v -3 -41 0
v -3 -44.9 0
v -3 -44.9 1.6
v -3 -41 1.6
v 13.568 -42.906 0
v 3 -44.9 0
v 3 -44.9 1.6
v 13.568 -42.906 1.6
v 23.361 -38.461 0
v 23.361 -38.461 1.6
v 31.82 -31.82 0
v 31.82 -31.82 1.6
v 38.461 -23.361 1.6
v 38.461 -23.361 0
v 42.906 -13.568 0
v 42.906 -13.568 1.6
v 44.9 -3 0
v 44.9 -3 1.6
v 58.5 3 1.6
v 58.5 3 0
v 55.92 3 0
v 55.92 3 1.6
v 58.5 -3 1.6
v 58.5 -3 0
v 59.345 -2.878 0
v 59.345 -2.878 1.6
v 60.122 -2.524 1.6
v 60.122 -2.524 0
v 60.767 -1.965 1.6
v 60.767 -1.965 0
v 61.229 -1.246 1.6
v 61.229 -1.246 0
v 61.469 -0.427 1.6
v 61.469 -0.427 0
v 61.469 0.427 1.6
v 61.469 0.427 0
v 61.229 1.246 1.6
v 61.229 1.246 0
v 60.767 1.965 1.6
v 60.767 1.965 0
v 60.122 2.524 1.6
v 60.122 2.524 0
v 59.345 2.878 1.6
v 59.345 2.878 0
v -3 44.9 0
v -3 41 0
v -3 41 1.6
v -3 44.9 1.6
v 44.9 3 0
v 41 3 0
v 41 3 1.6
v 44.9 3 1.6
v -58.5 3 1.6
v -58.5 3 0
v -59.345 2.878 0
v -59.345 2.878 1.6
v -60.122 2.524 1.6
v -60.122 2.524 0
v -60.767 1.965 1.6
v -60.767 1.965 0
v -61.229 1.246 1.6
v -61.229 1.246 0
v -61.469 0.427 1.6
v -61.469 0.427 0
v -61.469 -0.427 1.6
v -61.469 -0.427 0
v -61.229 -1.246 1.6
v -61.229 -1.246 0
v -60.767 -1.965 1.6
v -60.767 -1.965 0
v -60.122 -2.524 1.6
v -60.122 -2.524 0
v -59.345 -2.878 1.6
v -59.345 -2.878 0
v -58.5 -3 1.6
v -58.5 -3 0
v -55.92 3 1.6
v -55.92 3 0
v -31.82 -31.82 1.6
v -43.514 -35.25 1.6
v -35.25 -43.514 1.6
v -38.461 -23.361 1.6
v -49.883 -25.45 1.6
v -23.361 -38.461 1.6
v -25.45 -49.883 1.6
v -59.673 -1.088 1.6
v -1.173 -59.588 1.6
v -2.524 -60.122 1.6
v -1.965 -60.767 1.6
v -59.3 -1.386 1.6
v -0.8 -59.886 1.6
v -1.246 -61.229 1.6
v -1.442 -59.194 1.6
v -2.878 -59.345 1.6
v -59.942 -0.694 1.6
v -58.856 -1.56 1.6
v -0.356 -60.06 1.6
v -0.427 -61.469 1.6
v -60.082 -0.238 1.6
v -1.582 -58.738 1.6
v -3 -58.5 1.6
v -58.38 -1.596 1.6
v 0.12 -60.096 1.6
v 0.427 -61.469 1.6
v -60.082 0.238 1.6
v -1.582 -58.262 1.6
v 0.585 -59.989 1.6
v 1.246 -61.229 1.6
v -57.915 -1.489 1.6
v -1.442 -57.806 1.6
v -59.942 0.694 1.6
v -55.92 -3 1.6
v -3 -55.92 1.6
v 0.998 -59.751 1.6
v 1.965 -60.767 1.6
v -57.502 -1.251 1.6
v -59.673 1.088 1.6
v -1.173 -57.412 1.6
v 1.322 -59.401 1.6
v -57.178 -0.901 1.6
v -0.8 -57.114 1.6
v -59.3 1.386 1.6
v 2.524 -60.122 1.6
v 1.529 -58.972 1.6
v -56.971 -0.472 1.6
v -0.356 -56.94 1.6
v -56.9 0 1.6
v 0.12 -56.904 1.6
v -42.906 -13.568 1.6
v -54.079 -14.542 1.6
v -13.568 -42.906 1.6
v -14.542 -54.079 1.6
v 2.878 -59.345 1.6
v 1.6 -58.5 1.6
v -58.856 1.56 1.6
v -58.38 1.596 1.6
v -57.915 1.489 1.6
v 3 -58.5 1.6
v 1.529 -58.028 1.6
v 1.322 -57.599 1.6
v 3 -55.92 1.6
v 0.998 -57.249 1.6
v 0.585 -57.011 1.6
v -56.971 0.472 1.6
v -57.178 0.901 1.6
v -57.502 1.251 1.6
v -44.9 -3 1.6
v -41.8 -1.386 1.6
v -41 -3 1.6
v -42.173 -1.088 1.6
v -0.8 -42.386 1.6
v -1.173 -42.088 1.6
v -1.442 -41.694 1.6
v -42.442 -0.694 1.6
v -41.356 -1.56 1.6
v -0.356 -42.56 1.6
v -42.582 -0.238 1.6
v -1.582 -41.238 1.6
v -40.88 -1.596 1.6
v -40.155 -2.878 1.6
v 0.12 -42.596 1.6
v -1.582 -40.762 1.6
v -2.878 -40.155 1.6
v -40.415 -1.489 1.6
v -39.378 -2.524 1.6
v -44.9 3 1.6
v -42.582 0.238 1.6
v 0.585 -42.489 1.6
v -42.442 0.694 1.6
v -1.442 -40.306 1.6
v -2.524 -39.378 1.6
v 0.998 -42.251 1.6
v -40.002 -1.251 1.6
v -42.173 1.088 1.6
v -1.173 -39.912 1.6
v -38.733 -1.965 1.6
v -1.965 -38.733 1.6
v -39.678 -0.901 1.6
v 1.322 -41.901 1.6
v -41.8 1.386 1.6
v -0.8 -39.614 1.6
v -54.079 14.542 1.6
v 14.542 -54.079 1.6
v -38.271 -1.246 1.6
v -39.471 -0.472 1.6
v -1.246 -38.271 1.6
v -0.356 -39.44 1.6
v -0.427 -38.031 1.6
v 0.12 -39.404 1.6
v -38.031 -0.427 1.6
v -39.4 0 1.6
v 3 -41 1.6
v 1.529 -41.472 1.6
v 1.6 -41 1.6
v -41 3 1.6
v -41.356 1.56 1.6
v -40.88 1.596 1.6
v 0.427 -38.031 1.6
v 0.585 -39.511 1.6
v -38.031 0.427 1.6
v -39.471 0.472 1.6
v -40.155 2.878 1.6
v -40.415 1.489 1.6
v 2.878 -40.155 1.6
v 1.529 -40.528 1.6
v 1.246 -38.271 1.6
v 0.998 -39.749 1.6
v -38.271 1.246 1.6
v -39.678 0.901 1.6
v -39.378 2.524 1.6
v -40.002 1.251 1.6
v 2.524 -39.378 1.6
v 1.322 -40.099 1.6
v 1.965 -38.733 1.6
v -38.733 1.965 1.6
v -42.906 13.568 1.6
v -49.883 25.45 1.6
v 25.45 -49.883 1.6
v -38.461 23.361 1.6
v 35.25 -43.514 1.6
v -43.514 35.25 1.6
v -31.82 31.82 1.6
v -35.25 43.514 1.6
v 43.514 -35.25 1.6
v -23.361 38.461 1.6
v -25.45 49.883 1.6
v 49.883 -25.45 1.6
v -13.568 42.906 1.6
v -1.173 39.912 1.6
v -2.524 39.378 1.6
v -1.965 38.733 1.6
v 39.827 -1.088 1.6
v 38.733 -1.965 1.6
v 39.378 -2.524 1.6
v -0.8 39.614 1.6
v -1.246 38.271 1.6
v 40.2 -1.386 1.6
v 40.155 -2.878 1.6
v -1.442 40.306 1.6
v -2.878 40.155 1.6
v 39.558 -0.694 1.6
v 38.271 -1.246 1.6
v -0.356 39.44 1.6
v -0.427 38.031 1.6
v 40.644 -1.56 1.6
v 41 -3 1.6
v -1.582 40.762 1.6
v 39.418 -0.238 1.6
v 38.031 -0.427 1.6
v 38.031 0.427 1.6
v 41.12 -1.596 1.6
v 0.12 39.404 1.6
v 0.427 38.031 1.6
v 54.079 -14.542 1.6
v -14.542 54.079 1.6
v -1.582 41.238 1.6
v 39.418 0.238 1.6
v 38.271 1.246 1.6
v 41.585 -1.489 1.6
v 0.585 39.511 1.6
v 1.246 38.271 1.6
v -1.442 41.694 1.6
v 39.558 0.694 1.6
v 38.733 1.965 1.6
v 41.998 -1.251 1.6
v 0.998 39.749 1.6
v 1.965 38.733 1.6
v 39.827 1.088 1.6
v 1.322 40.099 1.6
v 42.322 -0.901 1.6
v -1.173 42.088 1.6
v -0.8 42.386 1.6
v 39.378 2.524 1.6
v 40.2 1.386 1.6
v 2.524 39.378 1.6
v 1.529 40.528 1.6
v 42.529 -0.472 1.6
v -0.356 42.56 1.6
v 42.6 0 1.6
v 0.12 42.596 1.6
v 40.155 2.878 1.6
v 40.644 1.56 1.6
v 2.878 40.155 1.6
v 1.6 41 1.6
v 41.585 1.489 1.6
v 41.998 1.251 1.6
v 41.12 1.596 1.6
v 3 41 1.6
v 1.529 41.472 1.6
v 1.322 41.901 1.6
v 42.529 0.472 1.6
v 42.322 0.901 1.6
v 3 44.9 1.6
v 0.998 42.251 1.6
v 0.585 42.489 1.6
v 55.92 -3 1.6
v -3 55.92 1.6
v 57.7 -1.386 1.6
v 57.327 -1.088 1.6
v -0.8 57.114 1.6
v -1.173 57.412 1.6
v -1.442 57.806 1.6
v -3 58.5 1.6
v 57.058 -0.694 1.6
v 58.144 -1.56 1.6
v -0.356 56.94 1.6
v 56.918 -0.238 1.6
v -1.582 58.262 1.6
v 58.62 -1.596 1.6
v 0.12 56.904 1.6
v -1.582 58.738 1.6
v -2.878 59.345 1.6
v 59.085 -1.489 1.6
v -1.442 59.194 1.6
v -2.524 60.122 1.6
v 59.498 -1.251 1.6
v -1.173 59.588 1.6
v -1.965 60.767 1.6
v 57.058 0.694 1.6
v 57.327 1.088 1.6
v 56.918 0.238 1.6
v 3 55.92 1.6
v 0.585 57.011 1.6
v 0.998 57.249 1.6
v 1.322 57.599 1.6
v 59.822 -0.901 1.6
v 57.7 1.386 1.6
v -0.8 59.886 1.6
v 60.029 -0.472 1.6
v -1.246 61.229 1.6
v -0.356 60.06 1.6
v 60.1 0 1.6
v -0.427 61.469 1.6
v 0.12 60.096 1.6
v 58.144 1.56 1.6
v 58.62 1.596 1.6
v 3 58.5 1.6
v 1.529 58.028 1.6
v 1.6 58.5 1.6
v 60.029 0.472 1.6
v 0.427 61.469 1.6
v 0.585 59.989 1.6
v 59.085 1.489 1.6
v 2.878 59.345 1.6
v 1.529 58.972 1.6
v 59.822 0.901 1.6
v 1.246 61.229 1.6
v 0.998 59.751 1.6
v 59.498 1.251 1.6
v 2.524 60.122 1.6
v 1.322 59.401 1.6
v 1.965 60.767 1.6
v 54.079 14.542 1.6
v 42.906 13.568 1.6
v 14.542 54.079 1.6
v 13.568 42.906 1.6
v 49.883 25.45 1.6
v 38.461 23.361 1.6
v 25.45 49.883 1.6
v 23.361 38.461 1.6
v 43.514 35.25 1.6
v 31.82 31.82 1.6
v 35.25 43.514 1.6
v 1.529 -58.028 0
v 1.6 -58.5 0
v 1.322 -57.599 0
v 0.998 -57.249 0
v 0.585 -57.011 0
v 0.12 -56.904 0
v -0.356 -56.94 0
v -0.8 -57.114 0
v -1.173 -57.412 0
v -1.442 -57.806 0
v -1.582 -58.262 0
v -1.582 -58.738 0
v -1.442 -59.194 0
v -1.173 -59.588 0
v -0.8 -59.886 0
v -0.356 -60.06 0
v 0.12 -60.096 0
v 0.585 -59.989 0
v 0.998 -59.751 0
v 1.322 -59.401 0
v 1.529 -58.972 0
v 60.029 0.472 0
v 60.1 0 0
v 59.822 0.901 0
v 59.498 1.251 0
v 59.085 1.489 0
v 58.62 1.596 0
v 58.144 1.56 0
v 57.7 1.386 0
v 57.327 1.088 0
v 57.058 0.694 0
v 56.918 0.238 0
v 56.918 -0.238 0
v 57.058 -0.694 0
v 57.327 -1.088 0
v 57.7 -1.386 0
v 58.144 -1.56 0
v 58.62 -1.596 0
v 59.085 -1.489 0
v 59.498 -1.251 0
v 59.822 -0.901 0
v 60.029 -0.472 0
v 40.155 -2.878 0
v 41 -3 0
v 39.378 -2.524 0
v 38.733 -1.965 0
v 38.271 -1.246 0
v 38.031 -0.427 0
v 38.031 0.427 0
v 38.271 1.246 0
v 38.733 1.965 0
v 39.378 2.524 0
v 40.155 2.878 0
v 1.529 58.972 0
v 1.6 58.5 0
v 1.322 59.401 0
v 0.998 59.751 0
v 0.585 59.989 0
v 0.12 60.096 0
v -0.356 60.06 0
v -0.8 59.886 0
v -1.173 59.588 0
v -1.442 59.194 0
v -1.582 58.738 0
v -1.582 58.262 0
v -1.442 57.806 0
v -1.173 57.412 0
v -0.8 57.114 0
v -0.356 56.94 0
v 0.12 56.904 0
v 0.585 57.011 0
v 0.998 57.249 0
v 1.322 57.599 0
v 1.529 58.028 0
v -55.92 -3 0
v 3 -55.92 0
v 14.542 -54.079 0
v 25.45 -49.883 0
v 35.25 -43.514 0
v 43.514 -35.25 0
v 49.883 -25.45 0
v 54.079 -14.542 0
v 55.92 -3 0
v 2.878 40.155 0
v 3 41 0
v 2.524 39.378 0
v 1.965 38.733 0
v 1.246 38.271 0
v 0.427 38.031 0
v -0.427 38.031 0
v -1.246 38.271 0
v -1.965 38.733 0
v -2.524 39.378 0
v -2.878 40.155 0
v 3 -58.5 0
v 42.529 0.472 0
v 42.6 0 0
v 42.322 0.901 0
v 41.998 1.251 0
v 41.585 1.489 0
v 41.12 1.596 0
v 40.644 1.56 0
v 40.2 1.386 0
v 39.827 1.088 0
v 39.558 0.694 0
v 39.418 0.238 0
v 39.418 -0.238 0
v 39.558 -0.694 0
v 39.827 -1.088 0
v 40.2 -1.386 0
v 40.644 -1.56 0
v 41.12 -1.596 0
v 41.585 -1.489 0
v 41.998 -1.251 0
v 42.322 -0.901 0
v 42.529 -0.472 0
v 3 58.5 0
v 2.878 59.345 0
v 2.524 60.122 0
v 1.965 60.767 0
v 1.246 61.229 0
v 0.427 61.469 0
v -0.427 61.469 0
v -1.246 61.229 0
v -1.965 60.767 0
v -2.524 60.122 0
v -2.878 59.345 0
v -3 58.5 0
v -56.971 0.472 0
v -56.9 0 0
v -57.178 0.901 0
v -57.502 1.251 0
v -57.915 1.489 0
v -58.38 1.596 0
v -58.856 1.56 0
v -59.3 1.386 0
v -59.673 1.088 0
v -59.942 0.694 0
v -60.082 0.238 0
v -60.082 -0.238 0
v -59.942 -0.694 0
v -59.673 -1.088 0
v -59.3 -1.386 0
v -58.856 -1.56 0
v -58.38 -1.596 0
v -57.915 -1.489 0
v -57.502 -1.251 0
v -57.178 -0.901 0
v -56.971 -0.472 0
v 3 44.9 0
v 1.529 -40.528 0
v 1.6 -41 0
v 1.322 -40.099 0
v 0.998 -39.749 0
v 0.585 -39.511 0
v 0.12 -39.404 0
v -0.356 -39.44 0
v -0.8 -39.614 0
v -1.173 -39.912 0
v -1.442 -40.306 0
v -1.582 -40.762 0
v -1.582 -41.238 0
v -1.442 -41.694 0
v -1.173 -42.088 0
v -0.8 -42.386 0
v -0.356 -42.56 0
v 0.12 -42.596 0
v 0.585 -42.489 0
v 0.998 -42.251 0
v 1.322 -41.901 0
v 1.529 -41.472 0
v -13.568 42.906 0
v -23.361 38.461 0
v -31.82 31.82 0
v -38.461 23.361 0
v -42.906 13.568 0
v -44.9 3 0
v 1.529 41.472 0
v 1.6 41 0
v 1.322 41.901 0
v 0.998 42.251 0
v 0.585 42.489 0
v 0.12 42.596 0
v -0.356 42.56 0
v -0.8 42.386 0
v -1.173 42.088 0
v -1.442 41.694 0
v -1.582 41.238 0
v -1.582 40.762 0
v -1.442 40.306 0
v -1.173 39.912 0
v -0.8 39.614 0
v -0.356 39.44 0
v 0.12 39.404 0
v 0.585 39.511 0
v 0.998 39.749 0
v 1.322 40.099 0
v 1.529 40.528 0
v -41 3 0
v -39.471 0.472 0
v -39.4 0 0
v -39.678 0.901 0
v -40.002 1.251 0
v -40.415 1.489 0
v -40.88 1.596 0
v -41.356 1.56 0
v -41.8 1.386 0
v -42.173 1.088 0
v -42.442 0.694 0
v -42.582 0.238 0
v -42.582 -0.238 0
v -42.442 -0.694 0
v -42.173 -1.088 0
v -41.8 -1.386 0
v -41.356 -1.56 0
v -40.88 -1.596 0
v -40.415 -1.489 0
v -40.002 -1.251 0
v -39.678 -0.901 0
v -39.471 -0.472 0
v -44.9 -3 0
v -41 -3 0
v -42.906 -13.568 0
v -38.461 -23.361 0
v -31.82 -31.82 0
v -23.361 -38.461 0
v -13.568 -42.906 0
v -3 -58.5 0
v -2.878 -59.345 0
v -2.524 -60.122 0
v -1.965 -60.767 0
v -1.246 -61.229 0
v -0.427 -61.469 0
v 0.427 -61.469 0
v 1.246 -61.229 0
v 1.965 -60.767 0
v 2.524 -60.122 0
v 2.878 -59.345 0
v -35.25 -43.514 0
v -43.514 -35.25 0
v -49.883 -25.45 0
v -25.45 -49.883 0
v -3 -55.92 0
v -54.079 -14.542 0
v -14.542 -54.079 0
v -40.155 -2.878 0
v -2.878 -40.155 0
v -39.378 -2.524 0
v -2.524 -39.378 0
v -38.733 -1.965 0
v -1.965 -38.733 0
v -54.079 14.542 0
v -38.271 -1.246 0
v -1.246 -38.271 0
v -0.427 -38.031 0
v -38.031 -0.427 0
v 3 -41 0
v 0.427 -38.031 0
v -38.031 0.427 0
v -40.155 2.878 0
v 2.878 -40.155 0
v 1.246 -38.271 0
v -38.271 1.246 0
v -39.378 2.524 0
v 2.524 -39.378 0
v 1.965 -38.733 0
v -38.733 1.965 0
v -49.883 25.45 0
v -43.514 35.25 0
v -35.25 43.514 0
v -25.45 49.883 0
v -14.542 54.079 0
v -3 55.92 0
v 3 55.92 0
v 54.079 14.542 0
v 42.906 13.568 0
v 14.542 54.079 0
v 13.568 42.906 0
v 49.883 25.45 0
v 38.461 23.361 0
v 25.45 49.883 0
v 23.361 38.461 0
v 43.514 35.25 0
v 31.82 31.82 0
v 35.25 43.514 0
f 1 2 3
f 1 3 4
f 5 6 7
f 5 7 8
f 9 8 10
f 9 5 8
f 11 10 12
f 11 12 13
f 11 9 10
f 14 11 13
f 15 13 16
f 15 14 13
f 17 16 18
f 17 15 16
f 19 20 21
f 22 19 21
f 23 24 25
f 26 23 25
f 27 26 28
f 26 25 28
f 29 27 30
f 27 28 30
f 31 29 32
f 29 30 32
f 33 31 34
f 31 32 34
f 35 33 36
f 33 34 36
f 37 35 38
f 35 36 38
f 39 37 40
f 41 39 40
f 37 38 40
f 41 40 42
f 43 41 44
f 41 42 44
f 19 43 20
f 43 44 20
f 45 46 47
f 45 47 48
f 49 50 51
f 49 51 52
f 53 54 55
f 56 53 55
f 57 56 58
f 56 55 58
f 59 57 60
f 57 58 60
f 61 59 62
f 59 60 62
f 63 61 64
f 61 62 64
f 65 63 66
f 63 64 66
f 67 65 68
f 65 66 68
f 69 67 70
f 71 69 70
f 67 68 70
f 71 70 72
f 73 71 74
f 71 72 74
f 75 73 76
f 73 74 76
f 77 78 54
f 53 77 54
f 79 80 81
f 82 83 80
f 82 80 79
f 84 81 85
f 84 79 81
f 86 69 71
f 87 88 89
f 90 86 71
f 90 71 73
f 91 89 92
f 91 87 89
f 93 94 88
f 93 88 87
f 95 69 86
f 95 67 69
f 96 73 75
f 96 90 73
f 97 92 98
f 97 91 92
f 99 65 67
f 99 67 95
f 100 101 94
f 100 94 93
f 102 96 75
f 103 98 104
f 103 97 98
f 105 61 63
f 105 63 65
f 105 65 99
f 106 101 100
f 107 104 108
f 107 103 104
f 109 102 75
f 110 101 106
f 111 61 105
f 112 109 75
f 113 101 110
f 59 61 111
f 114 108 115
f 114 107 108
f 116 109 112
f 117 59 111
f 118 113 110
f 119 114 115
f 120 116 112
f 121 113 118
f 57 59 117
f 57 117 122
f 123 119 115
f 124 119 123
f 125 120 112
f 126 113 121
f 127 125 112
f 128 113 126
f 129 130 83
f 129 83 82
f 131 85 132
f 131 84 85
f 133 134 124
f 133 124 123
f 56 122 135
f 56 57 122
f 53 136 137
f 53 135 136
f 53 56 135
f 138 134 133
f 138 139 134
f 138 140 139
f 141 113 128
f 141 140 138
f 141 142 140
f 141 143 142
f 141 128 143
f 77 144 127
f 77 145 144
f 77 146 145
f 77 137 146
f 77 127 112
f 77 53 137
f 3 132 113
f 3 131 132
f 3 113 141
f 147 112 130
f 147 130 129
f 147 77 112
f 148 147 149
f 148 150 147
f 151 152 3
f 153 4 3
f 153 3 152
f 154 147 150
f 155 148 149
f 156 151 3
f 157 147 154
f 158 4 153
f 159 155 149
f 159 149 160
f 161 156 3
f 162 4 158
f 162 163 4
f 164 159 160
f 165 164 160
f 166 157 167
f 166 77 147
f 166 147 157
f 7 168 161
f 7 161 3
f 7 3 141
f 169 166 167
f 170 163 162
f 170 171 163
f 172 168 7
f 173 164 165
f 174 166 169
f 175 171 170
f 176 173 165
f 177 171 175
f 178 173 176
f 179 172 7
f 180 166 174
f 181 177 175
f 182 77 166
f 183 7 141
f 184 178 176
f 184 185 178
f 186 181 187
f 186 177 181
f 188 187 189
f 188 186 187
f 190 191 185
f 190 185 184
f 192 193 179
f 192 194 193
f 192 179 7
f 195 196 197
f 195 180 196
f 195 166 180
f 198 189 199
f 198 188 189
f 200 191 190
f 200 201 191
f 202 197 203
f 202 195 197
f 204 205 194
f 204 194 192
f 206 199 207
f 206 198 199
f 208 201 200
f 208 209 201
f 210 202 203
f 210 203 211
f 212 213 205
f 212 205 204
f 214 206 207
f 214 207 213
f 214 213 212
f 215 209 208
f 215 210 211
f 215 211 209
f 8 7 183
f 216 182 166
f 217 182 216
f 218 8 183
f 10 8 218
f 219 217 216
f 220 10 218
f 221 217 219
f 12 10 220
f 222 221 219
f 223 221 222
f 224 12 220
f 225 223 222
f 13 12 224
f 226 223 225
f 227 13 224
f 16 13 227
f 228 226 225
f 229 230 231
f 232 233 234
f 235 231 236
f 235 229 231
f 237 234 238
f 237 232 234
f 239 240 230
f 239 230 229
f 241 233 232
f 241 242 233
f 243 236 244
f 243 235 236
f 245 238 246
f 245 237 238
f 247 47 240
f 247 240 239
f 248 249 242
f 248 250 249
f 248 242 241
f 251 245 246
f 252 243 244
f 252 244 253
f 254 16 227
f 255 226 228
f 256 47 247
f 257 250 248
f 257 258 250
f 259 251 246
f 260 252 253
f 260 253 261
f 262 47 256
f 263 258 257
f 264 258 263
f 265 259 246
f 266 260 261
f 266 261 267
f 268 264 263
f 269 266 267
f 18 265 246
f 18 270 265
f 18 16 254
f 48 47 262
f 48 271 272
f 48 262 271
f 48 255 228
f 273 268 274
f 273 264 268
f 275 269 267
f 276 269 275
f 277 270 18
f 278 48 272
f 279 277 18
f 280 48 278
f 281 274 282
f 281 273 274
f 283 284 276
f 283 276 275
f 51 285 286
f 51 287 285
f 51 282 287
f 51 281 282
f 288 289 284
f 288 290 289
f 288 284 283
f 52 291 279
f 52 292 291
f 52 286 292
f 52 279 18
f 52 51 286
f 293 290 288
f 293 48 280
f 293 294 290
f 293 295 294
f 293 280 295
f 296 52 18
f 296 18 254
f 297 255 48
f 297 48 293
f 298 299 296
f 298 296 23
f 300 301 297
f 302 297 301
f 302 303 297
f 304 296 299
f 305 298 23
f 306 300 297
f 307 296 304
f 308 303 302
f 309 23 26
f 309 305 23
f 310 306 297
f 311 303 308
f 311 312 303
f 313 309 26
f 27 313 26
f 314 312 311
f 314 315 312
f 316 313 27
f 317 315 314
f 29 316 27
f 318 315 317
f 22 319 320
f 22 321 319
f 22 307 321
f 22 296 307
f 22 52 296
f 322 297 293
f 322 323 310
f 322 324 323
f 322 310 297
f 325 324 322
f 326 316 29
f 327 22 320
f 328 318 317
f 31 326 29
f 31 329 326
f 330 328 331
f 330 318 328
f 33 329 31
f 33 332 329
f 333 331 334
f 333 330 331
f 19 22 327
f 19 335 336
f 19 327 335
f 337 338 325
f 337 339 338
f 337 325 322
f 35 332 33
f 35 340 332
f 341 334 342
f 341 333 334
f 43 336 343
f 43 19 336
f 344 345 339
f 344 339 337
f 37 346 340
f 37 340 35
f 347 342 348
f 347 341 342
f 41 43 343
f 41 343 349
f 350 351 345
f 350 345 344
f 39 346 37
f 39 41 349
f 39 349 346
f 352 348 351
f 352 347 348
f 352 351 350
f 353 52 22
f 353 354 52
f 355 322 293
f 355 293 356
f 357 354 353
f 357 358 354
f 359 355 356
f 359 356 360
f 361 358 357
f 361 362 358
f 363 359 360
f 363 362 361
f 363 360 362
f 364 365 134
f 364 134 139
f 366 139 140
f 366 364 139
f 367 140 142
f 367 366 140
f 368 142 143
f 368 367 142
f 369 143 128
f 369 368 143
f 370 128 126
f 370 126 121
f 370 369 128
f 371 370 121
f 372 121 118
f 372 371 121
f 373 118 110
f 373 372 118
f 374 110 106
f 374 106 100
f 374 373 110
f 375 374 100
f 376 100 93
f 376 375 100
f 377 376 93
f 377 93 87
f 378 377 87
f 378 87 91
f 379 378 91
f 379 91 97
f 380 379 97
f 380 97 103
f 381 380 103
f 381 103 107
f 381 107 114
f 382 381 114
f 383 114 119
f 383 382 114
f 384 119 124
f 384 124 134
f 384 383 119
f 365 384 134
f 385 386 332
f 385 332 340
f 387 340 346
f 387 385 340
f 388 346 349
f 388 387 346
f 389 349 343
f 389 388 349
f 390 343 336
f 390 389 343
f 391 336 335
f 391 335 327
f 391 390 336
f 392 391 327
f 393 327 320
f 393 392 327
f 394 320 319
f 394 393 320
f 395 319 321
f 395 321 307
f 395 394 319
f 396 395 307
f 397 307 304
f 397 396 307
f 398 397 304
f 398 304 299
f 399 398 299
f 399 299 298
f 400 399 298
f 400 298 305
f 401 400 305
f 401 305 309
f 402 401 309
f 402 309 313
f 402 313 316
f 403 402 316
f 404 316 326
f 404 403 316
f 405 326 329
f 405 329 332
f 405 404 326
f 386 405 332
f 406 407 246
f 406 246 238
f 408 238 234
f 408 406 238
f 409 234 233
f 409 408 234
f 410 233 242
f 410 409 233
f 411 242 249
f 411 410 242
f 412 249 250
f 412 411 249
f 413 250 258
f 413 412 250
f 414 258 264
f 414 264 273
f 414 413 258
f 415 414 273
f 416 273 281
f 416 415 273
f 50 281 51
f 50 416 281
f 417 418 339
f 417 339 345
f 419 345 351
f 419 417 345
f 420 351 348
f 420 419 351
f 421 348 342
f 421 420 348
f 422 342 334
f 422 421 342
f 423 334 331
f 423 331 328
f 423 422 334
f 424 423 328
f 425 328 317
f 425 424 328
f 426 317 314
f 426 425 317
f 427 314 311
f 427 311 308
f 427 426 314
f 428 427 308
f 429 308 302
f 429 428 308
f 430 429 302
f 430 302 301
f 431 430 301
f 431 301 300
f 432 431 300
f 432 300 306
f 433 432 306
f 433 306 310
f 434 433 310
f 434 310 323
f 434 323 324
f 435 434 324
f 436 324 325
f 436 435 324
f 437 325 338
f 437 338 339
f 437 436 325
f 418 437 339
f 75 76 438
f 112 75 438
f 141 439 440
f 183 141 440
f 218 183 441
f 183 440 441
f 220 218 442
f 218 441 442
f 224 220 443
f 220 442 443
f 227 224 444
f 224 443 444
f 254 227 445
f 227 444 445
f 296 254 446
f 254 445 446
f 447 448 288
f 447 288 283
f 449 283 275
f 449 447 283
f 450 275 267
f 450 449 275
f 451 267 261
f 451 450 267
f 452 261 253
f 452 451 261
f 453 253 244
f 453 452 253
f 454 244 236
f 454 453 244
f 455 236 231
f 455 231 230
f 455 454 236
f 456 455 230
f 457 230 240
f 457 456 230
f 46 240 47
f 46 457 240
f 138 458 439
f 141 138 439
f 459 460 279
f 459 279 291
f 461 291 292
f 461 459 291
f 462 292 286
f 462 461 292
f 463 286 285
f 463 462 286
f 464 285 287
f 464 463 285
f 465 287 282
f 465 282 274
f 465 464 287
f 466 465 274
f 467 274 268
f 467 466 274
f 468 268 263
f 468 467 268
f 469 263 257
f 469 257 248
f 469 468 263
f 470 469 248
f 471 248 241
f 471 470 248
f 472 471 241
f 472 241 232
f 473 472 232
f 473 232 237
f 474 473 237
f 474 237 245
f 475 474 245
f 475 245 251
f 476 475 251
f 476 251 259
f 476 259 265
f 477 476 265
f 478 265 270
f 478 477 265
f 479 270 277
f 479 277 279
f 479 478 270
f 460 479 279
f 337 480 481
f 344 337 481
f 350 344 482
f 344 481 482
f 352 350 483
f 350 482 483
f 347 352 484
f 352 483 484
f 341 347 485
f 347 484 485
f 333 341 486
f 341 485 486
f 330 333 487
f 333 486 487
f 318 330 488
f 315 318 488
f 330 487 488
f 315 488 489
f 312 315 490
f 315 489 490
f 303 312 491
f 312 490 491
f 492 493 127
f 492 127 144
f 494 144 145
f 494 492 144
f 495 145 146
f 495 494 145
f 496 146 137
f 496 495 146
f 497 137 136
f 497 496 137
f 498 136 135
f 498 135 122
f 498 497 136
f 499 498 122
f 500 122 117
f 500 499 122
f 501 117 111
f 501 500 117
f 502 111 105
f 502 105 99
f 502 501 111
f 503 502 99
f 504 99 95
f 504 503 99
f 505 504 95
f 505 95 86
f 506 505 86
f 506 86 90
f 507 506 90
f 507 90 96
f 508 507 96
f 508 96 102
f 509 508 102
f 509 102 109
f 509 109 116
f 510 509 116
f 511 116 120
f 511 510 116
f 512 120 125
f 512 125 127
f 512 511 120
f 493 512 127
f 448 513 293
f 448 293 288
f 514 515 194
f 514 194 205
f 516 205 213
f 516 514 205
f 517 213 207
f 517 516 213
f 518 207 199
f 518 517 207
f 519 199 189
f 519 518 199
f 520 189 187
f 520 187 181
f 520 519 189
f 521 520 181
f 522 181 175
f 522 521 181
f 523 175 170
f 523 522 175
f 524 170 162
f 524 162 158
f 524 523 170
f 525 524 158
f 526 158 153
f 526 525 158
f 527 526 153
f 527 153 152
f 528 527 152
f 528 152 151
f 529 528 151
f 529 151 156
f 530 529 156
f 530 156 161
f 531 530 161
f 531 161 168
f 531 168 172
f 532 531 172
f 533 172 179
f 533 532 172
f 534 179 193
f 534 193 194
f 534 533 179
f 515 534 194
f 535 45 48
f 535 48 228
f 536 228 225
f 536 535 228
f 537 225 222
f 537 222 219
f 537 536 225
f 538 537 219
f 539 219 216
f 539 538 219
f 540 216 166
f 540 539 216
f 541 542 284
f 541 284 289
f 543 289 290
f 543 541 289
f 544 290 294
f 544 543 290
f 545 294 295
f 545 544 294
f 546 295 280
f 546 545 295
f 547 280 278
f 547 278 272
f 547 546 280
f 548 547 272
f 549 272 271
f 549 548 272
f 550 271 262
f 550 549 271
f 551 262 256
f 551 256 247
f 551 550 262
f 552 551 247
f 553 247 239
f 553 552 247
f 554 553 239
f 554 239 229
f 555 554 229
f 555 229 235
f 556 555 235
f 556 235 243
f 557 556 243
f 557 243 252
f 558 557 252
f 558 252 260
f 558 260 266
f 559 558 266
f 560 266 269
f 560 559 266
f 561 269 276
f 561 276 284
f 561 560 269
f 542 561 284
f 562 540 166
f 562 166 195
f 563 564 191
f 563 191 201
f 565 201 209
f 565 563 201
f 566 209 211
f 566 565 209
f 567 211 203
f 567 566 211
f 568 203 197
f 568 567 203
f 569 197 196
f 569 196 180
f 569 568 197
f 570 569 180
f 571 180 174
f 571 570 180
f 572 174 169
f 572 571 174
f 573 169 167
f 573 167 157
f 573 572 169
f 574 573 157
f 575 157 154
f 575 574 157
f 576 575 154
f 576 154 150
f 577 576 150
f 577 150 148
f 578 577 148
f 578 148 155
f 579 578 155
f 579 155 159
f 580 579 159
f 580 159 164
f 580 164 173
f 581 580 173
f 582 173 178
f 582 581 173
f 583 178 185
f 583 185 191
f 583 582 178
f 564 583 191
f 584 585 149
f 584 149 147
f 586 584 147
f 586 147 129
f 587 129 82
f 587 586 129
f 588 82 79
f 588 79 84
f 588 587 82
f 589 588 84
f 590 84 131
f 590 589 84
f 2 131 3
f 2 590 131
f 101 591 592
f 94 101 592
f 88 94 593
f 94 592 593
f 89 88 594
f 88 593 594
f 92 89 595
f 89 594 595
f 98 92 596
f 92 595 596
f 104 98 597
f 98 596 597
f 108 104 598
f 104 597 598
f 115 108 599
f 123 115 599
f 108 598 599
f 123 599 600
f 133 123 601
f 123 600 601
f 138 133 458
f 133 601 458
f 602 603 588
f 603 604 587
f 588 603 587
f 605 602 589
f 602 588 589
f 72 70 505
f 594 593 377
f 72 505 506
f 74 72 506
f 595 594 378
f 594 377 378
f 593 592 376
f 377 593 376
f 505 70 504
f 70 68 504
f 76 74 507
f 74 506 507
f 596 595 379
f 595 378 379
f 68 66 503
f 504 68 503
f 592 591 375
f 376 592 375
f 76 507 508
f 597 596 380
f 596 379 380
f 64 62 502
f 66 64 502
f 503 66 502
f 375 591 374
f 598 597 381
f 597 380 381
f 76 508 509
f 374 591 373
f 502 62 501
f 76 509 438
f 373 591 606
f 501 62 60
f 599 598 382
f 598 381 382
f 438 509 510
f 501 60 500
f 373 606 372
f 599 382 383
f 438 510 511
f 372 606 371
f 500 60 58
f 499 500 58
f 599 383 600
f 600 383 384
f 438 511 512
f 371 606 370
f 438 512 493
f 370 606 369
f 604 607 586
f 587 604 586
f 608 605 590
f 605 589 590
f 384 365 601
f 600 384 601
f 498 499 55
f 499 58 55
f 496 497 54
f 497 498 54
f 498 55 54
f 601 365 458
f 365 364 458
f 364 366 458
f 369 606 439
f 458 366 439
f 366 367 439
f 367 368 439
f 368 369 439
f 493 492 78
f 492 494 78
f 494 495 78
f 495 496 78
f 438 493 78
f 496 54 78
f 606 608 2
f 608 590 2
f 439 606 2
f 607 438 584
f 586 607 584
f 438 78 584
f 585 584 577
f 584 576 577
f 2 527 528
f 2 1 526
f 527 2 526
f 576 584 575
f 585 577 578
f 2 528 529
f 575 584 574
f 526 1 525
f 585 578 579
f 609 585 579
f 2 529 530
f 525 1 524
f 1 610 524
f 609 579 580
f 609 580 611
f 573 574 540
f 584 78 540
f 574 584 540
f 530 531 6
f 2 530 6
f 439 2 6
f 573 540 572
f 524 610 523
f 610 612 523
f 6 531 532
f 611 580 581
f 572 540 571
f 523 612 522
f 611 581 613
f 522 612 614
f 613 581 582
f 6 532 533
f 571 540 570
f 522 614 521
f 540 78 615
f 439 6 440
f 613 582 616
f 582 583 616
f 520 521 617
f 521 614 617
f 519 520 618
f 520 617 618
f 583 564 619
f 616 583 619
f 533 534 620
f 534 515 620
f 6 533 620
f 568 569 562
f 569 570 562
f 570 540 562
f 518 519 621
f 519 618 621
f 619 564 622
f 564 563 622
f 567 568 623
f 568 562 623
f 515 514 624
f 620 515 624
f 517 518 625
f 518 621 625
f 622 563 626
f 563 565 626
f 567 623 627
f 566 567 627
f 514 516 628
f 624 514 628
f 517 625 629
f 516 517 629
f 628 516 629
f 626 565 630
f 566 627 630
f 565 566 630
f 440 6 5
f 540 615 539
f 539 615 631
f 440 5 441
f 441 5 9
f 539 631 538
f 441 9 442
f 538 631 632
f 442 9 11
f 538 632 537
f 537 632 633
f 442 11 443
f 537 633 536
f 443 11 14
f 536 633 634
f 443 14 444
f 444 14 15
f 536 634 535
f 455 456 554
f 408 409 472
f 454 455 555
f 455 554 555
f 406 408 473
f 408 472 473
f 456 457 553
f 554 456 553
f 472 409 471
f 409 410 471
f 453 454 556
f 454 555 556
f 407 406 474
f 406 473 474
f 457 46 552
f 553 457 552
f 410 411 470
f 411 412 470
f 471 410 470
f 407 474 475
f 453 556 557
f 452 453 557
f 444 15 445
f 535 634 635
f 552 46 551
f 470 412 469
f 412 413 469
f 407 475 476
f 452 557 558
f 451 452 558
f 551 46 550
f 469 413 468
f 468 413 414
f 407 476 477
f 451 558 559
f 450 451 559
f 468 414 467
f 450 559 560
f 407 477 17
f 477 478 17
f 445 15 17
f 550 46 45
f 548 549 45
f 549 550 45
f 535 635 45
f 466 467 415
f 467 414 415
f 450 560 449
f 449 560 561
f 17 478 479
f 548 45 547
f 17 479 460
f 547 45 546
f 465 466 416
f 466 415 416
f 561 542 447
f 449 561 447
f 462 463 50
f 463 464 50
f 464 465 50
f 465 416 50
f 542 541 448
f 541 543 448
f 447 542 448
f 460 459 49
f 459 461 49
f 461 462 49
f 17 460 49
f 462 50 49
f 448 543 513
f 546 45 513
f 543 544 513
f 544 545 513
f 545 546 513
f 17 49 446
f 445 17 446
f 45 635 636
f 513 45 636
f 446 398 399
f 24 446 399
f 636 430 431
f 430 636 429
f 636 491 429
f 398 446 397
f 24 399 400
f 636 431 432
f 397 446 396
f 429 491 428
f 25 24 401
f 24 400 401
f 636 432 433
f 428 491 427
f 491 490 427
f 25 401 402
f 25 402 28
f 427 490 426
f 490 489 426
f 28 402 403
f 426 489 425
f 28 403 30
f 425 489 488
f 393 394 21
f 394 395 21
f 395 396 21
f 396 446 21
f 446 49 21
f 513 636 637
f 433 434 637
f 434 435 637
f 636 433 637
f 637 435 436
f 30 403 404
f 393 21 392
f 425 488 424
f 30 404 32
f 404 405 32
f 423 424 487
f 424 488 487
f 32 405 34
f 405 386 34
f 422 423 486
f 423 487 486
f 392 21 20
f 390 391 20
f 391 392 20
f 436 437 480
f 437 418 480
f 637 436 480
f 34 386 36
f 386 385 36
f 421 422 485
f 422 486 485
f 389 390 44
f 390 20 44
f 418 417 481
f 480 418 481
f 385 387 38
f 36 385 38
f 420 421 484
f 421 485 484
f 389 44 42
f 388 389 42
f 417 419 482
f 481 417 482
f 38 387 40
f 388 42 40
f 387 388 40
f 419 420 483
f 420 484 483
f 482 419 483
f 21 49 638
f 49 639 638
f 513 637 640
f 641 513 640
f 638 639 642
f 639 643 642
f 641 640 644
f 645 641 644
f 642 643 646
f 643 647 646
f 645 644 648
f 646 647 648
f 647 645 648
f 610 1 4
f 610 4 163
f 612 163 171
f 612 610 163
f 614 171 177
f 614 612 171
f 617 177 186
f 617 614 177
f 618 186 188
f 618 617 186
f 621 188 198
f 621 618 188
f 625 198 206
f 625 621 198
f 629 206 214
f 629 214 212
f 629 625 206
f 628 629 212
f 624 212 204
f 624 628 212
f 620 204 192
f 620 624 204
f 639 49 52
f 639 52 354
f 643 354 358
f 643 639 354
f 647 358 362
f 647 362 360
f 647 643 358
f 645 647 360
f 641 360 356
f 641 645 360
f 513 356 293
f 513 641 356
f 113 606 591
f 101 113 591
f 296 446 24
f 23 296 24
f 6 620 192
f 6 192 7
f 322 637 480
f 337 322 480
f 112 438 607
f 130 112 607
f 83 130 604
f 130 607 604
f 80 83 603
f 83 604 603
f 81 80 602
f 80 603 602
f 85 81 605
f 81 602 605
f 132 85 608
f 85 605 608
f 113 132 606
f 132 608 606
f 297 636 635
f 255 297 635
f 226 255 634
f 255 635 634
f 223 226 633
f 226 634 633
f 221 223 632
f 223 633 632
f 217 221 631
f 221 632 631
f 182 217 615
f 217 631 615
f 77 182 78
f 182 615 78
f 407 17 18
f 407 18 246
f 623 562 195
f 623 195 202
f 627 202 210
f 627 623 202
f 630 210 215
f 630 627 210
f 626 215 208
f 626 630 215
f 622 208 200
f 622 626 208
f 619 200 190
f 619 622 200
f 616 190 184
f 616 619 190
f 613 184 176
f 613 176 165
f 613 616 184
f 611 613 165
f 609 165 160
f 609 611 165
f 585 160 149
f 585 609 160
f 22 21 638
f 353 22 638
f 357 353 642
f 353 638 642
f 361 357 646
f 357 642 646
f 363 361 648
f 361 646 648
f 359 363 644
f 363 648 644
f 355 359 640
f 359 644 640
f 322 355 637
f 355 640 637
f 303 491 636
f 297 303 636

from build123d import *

# Parameters (mm, degrees)
SKETCH1_R           = 1.6
BOSS_EXTRUDE1_DEPTH = 1.6


with BuildPart() as part:
    # Sketch1 → Boss-Extrude1 (new body)
    with BuildSketch(Plane.XY):
        with BuildLine():
            Line((-58.5, -3), (-55.91958512, -3))
            ThreePointArc((-55.91958512, -3), (-39.597979746, -39.597979746), (-3, -55.91958512))
            Line((-3, -55.91958512), (-3, -58.5))
            ThreePointArc((-3, -58.5), (0, -61.5), (3, -58.5))
            Line((3, -58.5), (3, -55.91958512))
            ThreePointArc((3, -55.91958512), (39.597979746, -39.597979746), (55.91958512, -3))
            Line((55.91958512, -3), (58.5, -3))
            ThreePointArc((58.5, -3), (61.5, 0), (58.5, 3))
            Line((58.5, 3), (55.91958512, 3))
            ThreePointArc((55.91958512, 3), (39.597979746, 39.597979746), (3, 55.91958512))
            Line((3, 55.91958512), (3, 58.5))
            ThreePointArc((3, 58.5), (0, 61.5), (-3, 58.5))
            Line((-3, 58.5), (-3, 55.91958512))
            ThreePointArc((-3, 55.91958512), (-39.597979746, 39.597979746), (-55.91958512, 3))
            Line((-55.91958512, 3), (-58.5, 3))
            ThreePointArc((-58.5, 3), (-61.5, 0), (-58.5, -3))
        make_face()
        with Locations((-41, 0)):
            Circle(SKETCH1_R, mode=Mode.SUBTRACT)
        with Locations((0, -41)):
            Circle(SKETCH1_R, mode=Mode.SUBTRACT)
        with Locations((41, 0)):
            Circle(SKETCH1_R, mode=Mode.SUBTRACT)
        with Locations((0, 41)):
            Circle(SKETCH1_R, mode=Mode.SUBTRACT)
        with Locations((-58.5, 0)):
            Circle(SKETCH1_R, mode=Mode.SUBTRACT)
        with Locations((0, 58.5)):
            Circle(SKETCH1_R, mode=Mode.SUBTRACT)
        with Locations((58.5, 0)):
            Circle(SKETCH1_R, mode=Mode.SUBTRACT)
        with Locations((0, -58.5)):
            Circle(SKETCH1_R, mode=Mode.SUBTRACT)
        with BuildLine():
            ThreePointArc((44.899888641, 3), (31.819805153, 31.819805153), (3, 44.899888641))
            Line((3, 44.899888641), (3, 41))
            ThreePointArc((3, 41), (0, 38), (-3, 41))
            Line((-3, 41), (-3, 44.899888641))
            ThreePointArc((-3, 44.899888641), (-31.819805153, 31.819805153), (-44.899888641, 3))
            Line((-44.899888641, 3), (-41, 3))
            ThreePointArc((-41, 3), (-38, 0), (-41, -3))
            Line((-41, -3), (-44.899888641, -3))
            ThreePointArc((-44.899888641, -3), (-31.819805153, -31.819805153), (-3, -44.899888641))
            Line((-3, -44.899888641), (-3, -41))
            ThreePointArc((-3, -41), (0, -38), (3, -41))
            Line((3, -41), (3, -44.899888641))
            ThreePointArc((3, -44.899888641), (31.819805153, -31.819805153), (44.899888641, -3))
            Line((44.899888641, -3), (41, -3))
            ThreePointArc((41, -3), (38, 0), (41, 3))
            Line((41, 3), (44.899888641, 3))
        make_face(mode=Mode.SUBTRACT)
    extrude(amount=BOSS_EXTRUDE1_DEPTH)


solid = part.part
